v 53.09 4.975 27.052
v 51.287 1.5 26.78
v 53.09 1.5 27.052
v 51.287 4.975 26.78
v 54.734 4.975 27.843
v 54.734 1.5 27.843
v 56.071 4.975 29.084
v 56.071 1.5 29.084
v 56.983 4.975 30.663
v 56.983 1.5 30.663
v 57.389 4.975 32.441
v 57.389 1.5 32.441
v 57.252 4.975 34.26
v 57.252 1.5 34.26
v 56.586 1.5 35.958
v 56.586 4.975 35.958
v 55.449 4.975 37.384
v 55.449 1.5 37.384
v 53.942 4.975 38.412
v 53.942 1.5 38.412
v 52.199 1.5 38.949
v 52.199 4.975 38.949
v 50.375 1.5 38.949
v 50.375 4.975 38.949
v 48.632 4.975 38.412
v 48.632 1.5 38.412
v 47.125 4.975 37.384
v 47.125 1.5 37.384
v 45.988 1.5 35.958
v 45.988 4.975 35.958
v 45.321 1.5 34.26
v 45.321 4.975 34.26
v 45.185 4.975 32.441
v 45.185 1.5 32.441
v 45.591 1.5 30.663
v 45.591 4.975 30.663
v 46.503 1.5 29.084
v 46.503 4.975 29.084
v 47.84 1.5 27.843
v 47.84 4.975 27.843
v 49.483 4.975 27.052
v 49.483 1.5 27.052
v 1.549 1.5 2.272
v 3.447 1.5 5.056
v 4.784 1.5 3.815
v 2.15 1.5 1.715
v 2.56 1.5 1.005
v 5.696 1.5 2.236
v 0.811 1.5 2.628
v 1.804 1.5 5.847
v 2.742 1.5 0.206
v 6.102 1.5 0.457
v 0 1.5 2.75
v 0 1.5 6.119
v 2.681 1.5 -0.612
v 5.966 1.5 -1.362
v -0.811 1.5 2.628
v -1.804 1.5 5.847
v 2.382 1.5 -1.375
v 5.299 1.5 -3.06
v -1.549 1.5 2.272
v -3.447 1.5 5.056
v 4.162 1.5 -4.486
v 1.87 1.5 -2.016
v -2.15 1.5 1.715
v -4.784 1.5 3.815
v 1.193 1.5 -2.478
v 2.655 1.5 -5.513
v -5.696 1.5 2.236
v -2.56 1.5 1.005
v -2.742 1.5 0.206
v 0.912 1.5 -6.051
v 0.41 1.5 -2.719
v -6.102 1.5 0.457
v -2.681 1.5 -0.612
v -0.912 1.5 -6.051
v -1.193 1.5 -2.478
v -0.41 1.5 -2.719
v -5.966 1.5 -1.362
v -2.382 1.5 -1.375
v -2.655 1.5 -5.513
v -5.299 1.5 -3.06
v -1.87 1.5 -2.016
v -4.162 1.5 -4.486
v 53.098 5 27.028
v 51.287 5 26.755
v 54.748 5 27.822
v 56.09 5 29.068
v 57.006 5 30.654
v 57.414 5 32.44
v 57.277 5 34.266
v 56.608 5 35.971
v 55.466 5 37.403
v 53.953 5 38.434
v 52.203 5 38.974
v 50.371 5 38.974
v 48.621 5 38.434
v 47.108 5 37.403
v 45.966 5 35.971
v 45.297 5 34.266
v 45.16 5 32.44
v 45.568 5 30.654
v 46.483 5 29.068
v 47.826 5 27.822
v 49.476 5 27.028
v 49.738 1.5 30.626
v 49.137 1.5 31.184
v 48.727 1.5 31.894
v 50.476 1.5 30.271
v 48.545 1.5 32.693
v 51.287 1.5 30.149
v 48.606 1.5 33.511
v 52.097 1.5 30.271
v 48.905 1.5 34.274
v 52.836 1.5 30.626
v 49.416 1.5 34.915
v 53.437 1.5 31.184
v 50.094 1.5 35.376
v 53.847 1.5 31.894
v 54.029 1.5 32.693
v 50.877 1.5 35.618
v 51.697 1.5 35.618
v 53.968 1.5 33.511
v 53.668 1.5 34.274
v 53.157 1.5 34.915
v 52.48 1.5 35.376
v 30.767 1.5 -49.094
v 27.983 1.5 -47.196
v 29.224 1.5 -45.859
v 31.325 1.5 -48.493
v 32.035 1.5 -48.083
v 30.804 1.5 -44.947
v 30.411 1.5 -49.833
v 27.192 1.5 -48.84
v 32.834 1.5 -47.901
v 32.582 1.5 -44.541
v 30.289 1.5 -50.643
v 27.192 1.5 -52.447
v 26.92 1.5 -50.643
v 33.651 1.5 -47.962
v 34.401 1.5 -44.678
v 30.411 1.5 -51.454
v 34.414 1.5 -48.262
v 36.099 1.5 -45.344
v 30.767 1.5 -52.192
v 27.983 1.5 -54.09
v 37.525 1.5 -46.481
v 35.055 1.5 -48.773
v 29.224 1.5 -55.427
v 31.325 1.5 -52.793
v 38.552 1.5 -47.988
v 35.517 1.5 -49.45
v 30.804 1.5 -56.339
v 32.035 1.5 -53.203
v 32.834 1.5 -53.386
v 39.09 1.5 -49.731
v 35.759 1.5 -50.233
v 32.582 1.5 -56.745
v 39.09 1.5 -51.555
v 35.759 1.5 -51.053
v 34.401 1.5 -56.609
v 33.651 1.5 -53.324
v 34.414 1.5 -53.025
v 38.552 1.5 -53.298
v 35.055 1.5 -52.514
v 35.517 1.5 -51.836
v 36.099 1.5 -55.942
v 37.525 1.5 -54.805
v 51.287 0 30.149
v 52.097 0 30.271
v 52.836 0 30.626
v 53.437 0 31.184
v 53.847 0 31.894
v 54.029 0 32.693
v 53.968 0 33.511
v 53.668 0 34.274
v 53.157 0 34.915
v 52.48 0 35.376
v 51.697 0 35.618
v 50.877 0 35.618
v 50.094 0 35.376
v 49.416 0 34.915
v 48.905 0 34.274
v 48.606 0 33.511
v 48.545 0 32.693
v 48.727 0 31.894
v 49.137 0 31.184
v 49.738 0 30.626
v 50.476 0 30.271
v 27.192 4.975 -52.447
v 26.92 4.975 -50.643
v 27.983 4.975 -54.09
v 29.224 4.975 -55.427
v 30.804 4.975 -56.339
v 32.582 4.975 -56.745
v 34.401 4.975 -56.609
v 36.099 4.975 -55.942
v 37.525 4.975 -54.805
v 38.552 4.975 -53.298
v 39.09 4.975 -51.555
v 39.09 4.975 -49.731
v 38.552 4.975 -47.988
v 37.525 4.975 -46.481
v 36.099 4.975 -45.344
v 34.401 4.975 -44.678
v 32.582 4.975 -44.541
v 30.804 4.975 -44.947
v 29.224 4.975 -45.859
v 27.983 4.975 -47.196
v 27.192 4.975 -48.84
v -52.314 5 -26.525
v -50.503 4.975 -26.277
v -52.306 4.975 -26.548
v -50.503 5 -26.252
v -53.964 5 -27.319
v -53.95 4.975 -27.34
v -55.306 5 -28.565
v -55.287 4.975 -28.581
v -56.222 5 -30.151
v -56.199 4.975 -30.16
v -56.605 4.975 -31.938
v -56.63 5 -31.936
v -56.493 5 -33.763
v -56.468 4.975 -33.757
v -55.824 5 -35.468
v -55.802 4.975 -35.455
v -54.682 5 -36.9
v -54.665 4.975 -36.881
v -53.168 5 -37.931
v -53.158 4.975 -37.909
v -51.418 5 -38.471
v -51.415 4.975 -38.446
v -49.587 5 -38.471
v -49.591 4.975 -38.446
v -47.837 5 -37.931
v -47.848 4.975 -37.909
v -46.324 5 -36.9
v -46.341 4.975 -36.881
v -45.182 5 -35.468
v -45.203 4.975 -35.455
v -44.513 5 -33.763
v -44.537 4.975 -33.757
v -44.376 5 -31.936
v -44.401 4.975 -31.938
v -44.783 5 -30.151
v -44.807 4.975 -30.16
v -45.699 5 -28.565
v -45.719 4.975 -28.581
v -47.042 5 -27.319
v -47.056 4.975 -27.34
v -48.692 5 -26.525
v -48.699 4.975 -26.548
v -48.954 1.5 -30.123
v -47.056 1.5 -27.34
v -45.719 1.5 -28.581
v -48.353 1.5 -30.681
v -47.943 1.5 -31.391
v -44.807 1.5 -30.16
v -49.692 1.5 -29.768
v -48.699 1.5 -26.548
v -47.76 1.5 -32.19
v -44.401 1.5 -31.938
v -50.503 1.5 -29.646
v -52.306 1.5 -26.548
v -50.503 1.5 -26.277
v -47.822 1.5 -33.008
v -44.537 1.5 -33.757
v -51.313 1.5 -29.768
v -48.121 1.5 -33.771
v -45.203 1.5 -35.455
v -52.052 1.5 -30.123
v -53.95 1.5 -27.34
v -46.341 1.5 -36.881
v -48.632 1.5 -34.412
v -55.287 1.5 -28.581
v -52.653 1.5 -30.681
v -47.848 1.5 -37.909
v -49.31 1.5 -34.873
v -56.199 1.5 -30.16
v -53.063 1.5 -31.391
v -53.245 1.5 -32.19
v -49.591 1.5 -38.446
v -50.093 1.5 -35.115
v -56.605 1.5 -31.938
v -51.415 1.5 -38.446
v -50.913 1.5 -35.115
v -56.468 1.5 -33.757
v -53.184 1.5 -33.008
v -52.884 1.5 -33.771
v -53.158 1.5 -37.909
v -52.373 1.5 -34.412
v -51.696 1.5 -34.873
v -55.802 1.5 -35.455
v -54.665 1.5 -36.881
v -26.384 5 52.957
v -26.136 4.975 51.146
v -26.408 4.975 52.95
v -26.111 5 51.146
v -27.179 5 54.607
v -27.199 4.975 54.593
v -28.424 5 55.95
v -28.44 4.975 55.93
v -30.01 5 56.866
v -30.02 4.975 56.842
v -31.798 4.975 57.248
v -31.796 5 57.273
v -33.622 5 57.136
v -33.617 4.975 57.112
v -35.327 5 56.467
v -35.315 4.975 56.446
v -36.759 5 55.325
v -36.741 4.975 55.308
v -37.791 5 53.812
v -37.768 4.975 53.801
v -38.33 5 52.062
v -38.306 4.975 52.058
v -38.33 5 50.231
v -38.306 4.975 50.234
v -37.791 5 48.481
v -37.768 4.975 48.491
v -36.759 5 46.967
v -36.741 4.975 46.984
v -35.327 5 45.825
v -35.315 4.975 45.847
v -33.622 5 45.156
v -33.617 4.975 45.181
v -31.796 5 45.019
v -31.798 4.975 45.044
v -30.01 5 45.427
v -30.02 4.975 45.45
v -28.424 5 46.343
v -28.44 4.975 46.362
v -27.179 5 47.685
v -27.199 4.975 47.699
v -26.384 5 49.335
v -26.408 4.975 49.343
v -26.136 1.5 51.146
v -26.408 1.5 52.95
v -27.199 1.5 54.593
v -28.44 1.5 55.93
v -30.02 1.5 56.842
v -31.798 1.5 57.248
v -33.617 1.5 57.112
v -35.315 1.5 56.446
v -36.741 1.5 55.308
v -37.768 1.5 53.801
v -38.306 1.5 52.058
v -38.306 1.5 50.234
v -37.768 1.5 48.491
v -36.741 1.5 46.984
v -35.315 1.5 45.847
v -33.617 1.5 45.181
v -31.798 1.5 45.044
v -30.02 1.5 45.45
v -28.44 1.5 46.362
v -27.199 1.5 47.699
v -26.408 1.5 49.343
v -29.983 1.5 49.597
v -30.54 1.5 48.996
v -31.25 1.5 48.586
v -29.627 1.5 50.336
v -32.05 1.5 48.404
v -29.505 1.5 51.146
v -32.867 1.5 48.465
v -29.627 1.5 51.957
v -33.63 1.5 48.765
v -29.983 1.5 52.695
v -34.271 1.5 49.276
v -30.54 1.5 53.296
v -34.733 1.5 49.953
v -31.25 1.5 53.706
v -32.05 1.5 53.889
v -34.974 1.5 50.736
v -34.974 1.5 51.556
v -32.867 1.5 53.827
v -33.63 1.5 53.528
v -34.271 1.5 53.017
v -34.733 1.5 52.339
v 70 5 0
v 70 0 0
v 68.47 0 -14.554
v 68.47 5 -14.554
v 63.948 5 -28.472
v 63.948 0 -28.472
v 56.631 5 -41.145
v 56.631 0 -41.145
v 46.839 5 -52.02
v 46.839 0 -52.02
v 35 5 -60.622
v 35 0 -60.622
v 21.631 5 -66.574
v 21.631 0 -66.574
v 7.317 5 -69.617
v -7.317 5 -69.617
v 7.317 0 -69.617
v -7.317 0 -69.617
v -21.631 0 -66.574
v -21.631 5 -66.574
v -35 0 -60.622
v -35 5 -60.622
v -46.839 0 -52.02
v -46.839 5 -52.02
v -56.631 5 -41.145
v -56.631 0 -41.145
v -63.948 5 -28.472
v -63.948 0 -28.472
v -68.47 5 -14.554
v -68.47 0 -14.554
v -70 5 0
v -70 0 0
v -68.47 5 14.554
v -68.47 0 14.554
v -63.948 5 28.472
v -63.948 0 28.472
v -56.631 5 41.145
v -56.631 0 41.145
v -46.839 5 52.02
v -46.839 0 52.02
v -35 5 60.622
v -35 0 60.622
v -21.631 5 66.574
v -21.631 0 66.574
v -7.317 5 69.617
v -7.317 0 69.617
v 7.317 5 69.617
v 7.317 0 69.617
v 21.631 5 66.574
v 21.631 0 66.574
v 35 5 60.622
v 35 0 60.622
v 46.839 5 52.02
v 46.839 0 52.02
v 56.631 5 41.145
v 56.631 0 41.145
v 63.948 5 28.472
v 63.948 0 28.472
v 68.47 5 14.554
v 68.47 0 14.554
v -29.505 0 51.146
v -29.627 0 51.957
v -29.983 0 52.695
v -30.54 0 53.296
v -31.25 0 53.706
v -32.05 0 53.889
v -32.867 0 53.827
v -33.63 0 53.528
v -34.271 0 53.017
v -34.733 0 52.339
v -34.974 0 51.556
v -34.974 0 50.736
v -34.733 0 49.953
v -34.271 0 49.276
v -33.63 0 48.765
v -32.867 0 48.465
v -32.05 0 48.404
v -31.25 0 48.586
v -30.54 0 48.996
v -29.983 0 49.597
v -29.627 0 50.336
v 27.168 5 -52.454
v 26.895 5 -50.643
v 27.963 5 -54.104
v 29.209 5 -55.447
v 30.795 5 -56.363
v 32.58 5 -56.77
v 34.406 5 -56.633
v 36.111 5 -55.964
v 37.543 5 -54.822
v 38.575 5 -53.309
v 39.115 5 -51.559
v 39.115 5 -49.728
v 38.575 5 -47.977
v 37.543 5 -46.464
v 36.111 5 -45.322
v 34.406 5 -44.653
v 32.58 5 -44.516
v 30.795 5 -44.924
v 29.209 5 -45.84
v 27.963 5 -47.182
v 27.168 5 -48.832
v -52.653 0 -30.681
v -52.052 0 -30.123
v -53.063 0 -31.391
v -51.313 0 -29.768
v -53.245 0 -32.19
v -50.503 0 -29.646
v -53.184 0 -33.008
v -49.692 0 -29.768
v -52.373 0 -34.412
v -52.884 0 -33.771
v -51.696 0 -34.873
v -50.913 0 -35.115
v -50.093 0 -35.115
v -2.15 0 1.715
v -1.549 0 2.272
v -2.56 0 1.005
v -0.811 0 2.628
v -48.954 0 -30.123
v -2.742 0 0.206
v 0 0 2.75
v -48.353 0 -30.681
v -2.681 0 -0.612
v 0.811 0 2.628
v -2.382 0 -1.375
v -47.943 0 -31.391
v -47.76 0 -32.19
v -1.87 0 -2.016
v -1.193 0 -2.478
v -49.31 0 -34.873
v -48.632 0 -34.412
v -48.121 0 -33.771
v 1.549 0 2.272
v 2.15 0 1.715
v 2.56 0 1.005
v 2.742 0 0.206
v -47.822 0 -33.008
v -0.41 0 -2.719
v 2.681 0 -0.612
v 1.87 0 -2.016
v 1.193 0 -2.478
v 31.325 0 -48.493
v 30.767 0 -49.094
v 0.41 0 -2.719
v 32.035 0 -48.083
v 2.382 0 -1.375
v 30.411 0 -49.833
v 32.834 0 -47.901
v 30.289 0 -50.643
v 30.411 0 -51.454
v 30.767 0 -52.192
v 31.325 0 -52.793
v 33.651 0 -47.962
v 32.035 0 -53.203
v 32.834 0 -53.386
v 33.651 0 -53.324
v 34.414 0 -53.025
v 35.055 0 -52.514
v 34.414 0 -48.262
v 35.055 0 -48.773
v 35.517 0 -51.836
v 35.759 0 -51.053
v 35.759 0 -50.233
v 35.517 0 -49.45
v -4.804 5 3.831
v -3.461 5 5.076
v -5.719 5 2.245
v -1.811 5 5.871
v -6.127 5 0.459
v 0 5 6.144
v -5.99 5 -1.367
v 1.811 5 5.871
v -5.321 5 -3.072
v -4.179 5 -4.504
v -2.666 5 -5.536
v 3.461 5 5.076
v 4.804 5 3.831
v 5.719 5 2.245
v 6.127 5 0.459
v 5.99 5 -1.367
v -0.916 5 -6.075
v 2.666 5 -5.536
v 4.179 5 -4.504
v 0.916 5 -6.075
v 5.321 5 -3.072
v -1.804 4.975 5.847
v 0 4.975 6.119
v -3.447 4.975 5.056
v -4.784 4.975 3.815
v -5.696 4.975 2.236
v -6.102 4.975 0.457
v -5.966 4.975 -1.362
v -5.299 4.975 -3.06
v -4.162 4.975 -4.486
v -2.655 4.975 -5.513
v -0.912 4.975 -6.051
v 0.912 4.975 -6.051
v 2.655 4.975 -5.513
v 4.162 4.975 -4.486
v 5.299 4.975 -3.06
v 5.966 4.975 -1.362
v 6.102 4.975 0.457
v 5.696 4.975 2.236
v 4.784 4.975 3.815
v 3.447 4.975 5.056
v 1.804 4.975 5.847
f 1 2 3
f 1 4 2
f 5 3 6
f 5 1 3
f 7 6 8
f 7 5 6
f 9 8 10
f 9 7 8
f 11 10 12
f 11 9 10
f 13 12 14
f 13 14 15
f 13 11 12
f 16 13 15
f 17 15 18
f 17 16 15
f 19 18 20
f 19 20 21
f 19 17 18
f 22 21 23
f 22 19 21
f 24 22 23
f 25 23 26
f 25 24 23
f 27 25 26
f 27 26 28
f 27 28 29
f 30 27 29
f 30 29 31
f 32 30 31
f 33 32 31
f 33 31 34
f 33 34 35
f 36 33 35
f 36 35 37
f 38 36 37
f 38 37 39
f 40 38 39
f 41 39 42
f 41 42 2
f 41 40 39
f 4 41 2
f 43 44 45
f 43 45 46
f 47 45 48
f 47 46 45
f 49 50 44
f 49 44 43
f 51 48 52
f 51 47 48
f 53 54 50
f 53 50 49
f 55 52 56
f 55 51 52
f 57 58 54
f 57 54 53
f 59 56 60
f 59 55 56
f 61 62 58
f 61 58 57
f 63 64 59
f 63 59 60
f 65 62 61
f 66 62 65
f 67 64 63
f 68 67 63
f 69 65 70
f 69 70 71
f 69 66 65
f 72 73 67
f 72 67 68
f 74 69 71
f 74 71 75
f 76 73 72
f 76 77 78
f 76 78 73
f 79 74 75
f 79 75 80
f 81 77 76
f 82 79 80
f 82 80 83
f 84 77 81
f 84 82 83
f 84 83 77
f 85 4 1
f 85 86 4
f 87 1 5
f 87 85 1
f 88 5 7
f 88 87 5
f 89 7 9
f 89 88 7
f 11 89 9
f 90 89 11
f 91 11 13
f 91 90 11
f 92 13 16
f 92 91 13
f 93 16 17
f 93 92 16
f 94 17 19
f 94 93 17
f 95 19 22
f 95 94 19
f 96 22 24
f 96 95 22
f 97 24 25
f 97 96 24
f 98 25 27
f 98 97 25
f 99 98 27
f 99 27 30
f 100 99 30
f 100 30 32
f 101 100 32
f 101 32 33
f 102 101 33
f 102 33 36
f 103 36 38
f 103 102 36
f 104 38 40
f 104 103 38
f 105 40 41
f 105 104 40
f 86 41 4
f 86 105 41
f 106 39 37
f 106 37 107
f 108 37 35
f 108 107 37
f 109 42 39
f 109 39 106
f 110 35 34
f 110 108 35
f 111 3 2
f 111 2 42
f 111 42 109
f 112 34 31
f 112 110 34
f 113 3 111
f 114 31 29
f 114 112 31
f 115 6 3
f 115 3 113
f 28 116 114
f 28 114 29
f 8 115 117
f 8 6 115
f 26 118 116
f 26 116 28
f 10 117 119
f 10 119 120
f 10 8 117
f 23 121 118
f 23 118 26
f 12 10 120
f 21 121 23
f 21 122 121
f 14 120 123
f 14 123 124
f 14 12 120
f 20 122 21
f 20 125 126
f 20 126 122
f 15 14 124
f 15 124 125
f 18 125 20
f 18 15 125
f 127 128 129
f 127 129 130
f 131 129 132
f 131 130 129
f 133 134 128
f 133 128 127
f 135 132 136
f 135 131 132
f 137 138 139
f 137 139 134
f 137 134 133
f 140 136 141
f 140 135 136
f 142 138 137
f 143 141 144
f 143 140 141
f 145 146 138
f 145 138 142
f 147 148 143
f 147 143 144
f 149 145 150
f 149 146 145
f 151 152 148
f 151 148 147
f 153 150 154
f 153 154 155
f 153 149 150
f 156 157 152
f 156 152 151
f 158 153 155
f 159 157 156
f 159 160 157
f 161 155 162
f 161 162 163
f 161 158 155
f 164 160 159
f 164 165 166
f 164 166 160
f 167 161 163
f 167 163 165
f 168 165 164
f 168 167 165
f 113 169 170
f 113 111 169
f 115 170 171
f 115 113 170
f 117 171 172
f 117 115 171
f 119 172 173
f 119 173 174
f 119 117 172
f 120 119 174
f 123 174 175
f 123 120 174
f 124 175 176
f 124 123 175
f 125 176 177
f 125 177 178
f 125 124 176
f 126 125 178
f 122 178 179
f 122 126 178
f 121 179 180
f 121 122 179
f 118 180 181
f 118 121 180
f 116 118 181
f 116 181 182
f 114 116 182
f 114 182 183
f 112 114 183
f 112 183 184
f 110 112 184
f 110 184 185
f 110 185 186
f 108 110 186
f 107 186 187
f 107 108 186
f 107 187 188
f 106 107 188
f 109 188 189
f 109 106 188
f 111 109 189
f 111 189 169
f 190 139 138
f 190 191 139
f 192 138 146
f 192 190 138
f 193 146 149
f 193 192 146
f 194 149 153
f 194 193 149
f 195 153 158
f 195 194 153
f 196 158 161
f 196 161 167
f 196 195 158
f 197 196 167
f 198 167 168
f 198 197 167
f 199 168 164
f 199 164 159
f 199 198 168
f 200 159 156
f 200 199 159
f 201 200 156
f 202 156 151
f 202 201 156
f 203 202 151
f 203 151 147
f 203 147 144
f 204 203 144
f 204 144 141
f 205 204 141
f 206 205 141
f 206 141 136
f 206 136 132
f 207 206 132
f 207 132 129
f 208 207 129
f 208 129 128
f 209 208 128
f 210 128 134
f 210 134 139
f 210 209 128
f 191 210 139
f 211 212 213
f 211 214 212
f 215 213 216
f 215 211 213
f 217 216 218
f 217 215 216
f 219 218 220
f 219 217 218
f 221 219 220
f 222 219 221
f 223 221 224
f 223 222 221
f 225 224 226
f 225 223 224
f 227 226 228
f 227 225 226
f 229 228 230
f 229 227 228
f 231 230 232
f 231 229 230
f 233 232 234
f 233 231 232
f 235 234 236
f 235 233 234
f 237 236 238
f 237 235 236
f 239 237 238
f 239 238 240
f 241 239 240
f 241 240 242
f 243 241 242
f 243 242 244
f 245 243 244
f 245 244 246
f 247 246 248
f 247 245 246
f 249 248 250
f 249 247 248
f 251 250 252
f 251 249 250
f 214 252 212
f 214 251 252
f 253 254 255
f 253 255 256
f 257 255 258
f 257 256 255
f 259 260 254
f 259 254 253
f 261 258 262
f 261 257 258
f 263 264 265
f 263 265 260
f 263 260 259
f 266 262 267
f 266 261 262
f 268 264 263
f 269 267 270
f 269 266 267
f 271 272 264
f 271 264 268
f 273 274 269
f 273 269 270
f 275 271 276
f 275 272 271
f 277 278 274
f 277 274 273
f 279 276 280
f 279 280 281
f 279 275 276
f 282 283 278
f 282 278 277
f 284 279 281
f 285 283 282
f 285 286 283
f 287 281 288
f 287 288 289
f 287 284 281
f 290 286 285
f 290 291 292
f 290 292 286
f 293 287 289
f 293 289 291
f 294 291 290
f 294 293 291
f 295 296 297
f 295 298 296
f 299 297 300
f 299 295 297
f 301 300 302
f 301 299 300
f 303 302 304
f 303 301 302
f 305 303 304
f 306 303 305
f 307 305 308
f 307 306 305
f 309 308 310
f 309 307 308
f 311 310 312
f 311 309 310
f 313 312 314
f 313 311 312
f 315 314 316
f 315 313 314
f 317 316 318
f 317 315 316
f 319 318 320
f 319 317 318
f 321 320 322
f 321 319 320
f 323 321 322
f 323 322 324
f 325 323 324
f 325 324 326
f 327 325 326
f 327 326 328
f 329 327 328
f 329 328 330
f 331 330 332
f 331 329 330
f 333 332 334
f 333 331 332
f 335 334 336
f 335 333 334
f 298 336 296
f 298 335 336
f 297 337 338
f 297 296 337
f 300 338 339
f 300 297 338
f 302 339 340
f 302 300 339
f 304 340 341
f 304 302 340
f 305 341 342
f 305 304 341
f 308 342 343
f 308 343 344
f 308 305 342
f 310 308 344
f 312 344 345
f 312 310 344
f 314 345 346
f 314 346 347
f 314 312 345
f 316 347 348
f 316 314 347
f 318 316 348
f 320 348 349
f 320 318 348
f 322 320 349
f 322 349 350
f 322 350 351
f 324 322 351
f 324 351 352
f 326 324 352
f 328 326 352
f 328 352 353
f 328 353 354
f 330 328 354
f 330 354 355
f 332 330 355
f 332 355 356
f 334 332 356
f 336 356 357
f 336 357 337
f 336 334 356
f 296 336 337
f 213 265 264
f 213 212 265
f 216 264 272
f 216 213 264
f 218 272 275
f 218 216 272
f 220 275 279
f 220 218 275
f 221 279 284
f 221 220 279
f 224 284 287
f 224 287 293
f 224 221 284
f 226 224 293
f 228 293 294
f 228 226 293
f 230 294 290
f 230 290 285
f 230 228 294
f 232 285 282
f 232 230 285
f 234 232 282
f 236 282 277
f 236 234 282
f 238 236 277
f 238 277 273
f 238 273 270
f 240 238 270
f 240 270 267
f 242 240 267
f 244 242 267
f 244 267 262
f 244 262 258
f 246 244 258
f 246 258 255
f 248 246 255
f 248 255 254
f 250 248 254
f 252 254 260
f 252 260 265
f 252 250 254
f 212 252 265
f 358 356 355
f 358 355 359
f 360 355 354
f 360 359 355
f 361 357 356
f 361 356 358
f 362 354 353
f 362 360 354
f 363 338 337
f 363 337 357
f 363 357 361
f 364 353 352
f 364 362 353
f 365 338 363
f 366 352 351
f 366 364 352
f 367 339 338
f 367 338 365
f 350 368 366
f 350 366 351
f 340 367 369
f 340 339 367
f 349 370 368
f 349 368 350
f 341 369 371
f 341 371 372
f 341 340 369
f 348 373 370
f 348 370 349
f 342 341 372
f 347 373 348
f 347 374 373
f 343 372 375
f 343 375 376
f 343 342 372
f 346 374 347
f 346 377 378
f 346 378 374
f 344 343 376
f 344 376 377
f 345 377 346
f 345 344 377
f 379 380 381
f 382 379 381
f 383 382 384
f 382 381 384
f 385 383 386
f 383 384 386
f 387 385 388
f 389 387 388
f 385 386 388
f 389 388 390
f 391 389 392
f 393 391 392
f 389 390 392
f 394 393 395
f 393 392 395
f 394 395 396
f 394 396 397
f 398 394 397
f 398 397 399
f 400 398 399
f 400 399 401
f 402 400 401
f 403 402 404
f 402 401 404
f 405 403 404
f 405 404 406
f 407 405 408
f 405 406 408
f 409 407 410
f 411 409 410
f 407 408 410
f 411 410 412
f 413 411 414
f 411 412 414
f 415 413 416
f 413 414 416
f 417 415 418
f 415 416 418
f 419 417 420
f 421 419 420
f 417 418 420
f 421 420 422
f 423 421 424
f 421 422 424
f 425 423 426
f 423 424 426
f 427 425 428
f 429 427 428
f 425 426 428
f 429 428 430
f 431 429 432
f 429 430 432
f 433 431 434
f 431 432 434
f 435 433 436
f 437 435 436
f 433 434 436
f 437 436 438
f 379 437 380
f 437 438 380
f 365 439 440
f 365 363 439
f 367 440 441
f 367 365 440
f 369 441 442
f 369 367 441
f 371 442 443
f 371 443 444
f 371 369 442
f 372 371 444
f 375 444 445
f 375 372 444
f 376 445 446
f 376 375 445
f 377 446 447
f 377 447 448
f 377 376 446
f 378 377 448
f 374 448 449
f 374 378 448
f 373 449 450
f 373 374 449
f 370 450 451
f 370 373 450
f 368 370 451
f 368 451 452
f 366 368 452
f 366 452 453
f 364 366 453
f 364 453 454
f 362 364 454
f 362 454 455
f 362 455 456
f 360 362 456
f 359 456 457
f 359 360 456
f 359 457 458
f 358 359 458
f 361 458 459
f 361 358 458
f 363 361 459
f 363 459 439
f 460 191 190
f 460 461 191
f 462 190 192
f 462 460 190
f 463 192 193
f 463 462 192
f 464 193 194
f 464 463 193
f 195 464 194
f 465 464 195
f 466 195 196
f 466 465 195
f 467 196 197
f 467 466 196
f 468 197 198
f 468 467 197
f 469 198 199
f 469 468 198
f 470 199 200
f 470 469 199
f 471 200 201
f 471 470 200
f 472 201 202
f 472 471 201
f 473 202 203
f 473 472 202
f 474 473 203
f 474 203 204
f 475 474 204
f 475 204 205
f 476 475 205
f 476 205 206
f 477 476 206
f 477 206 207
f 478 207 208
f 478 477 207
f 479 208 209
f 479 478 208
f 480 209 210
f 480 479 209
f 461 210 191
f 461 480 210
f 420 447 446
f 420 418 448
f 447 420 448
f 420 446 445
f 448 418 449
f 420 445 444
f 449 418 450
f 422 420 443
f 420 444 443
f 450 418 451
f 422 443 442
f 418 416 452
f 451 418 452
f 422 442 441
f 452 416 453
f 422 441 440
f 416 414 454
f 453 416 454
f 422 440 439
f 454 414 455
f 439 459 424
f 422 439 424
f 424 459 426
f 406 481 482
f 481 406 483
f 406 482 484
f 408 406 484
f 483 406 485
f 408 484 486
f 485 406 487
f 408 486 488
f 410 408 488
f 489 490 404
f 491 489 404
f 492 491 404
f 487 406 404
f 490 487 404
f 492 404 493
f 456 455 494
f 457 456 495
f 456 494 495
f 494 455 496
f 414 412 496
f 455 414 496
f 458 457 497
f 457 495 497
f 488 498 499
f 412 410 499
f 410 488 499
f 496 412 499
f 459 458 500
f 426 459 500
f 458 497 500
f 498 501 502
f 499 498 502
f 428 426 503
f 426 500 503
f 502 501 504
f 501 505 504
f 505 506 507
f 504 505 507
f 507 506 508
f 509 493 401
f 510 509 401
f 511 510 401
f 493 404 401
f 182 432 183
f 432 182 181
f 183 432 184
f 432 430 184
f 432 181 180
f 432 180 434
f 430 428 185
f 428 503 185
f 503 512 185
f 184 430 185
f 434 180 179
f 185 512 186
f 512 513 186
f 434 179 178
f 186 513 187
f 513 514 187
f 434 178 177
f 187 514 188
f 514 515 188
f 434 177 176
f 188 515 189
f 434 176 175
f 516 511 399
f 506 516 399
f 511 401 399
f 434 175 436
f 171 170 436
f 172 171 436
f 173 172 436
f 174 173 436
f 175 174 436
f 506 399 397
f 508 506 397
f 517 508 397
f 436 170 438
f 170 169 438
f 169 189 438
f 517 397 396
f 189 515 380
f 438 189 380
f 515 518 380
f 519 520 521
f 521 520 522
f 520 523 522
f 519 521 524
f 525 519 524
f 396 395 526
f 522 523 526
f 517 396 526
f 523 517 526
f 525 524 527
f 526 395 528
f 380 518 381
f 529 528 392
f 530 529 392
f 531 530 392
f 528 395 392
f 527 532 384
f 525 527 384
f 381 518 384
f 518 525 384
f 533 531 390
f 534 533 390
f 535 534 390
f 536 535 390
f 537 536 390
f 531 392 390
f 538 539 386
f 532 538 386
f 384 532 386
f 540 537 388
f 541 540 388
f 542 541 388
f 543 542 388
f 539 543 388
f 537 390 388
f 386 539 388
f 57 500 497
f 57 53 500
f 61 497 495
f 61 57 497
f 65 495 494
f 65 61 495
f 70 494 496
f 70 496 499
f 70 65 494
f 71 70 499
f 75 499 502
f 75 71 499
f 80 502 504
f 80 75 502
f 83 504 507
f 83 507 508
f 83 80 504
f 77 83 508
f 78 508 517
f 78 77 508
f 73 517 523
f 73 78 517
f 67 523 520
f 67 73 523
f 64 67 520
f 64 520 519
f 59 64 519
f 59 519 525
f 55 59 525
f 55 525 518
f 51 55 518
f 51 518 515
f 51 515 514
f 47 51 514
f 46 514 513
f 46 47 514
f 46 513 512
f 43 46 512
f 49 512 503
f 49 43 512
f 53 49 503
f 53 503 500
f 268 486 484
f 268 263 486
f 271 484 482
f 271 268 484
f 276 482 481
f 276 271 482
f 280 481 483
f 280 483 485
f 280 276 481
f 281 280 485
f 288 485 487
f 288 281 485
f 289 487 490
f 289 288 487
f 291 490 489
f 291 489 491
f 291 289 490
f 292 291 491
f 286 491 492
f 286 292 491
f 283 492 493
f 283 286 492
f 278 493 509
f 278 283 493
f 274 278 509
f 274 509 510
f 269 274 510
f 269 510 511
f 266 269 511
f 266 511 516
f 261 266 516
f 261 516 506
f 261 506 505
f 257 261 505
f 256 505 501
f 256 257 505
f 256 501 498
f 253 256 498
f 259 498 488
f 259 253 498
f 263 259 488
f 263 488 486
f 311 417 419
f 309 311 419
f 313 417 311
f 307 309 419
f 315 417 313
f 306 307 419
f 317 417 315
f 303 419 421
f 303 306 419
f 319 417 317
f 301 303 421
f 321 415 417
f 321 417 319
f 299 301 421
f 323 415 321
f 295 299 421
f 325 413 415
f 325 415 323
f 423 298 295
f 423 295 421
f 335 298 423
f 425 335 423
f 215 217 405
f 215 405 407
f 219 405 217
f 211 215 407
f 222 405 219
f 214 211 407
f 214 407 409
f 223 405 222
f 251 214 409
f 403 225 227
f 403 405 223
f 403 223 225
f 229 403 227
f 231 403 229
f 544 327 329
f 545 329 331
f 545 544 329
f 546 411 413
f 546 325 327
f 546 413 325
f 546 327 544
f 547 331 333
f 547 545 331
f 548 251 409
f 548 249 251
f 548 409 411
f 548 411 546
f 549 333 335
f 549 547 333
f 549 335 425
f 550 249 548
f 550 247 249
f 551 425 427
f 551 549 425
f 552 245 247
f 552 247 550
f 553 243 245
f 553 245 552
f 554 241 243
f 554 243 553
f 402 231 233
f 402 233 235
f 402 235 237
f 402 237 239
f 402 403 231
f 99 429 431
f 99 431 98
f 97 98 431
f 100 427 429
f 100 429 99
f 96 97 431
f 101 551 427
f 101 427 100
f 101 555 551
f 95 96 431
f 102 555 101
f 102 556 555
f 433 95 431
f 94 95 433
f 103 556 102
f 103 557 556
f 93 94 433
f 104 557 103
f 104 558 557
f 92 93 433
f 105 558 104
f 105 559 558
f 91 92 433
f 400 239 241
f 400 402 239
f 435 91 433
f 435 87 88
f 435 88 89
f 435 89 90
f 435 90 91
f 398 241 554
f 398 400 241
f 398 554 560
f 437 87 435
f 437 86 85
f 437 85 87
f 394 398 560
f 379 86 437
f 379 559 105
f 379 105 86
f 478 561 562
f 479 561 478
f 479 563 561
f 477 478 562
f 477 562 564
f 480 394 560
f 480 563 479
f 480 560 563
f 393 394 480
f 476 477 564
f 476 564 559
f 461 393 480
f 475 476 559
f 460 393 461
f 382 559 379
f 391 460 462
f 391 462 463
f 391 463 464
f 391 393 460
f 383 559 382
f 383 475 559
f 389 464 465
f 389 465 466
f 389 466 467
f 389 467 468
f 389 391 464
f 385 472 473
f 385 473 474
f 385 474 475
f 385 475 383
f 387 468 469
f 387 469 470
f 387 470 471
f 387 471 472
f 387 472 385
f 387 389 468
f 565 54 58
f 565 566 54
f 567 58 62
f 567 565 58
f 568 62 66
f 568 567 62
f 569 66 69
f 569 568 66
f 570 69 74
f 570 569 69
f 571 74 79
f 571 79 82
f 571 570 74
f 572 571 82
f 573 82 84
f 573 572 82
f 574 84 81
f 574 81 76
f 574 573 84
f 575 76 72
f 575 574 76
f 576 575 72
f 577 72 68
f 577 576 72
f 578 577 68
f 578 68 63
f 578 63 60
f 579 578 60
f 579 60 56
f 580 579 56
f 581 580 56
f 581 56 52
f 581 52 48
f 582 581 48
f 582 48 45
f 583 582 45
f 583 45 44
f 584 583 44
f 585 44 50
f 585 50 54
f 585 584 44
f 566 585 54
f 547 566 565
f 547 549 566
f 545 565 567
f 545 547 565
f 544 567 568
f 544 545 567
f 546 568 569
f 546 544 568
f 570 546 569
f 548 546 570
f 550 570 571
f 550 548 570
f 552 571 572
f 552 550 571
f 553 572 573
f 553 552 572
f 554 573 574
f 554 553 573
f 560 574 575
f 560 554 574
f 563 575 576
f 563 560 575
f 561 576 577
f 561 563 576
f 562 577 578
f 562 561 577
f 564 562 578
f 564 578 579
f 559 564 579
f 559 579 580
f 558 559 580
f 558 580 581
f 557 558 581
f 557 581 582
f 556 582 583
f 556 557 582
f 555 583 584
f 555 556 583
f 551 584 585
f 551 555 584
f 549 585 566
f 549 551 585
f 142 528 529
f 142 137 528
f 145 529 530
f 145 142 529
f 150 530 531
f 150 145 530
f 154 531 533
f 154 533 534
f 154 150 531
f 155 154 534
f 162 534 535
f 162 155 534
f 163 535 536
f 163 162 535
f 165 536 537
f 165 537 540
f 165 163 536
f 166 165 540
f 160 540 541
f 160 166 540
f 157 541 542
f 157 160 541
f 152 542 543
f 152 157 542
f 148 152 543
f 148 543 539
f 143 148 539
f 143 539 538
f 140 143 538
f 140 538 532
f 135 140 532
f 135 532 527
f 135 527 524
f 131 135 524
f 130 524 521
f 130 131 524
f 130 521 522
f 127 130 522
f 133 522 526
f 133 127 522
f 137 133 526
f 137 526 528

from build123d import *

# Parameters (mm, degrees)
SKETCH1_R           = 70
BOSS_EXTRUDE1_DEPTH = 5
CIRPATTERN1_COUNT   = 4


with BuildPart() as part:
    # Sketch1 → Boss-Extrude1 (new body)
    with BuildSketch(Plane(origin=(0, 0, 0), x_dir=(1, 0, 0), z_dir=(0, 1, 0))):
        Circle(SKETCH1_R)
    extrude(amount=BOSS_EXTRUDE1_DEPTH)

    # Sketch3 → CBORE for M5 Hex Head Bolt1 (revolve, cut)
    with BuildSketch(Plane(origin=(-50.502701159, 5, -32.395635133), x_dir=(0, 0, 1), z_dir=(1, 0, 0))):
        Polygon((0, 0), (0, 5), (2.75, 5), (2.75, 3.5), (6.119, 3.5), (6.119, 0.025), (6.144, 0), align=None)
    cbore_for_m5_hex_head_bolt1 = revolve(axis=Axis((-50.502701159, 11.35, -32.395635133), (0, -1, 0)), mode=Mode.SUBTRACT)

    # CirPattern1: CBORE for M5 Hex Head Bolt1 ×4 about axis
    cirpattern1_axis = Axis((0.392084454, 0, 0.251507833), (0, 1, 0))
    for i in range(1, CIRPATTERN1_COUNT):
        add(cbore_for_m5_hex_head_bolt1.rotate(cirpattern1_axis, i * 360 / CIRPATTERN1_COUNT), mode=Mode.SUBTRACT)

    # Sketch7 → CBORE for M5 Hex Head Bolt2 (revolve, cut)
    with BuildSketch(Plane(origin=(0, 5, 0), x_dir=(0, 0, 1), z_dir=(1, 0, 0))):
        Polygon((0, 0), (0, 5), (2.75, 5), (2.75, 3.5), (6.119, 3.5), (6.119, 0.025), (6.144, 0), align=None)
    revolve(axis=Axis((0, 11.35, 0), (0, -1, 0)), mode=Mode.SUBTRACT)


solid = part.part
